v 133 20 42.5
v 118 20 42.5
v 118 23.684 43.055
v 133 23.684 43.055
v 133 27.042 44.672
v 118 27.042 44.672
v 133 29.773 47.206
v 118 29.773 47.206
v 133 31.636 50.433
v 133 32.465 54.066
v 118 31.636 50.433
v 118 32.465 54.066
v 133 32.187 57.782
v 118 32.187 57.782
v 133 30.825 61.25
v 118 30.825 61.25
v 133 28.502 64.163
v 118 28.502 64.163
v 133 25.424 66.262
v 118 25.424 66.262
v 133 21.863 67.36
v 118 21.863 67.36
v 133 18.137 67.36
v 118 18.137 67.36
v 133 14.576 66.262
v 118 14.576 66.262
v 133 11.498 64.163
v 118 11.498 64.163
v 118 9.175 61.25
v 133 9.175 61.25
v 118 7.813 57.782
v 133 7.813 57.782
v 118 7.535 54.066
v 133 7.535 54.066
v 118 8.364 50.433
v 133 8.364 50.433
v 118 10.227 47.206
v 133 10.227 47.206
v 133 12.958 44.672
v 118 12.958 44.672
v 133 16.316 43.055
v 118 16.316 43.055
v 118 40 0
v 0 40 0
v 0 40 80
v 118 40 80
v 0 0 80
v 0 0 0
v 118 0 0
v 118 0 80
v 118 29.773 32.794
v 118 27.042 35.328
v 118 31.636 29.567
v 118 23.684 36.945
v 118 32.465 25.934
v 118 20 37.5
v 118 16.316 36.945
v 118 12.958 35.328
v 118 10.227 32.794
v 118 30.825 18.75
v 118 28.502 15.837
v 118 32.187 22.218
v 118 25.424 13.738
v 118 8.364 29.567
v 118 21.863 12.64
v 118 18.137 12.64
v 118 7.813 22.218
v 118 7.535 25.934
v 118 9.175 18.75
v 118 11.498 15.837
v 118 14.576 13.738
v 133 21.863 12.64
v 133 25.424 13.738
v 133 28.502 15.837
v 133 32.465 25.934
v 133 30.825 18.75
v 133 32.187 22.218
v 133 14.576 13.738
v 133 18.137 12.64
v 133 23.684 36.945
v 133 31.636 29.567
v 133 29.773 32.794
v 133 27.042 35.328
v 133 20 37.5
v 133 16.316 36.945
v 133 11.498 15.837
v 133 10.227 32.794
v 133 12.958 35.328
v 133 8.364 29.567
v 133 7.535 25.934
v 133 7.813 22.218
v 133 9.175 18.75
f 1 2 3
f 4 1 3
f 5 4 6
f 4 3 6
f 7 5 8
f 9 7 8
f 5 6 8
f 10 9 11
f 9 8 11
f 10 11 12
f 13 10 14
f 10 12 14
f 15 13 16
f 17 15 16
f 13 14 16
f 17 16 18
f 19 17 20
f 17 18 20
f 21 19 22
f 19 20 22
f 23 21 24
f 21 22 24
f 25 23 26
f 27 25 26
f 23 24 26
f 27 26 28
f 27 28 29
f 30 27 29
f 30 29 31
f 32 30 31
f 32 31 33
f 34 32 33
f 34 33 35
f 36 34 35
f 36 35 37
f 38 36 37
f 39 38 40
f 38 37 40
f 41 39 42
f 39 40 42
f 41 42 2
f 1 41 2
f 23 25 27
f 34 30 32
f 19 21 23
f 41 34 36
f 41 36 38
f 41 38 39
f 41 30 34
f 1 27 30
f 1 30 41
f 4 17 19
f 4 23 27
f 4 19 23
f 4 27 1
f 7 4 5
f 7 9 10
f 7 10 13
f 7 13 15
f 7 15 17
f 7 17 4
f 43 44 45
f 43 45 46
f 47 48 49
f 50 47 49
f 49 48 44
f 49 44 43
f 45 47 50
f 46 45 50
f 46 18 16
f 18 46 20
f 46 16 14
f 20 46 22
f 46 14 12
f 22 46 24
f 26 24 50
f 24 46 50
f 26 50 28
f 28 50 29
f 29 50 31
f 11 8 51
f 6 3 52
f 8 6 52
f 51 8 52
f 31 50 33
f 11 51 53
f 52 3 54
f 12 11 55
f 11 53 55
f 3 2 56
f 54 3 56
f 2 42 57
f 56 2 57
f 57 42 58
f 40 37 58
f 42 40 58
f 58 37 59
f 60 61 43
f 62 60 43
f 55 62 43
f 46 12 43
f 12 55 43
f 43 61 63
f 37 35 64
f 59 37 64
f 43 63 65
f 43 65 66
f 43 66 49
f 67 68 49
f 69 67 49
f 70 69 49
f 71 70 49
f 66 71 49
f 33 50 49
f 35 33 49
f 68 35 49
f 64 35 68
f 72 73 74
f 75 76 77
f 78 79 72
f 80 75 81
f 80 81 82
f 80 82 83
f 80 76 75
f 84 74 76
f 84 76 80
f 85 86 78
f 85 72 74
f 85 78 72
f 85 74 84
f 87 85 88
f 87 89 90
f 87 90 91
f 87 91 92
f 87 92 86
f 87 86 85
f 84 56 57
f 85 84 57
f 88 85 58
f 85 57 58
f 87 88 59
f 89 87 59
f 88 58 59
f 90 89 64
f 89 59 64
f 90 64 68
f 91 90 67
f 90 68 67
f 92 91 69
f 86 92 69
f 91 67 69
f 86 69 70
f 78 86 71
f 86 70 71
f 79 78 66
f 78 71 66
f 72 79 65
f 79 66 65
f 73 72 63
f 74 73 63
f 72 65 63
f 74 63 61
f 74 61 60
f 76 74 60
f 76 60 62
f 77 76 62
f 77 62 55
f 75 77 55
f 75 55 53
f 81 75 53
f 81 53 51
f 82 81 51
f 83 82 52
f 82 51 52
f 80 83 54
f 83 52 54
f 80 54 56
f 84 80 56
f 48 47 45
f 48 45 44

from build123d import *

# Parameters (mm, degrees)
SKETCH2_W           = 118
SKETCH2_H           = 80
BOSS_EXTRUDE1_DEPTH = 40
SKETCH3_R           = 12.5
BOSS_EXTRUDE2_DEPTH = 15


with BuildPart() as part:
    # Sketch2 → Boss-Extrude1 (new body)
    with BuildSketch(Plane(origin=(0, 0, 0), x_dir=(1, 0, 0), z_dir=(0, 1, 0))):
        with Locations((59, -40)):
            Rectangle(SKETCH2_W, SKETCH2_H)
    extrude(amount=BOSS_EXTRUDE1_DEPTH)

    # Sketch3 → Boss-Extrude2 (add)
    with BuildSketch(Plane(origin=(118, 0, 0), x_dir=(0, 0, -1), z_dir=(1, 0, 0))):
        with Locations((-55, 20)):
            Circle(SKETCH3_R)
        with Locations(Location((-25, 20, 0), (0, 0, 180))):
            Circle(SKETCH3_R)
    extrude(amount=BOSS_EXTRUDE2_DEPTH)


solid = part.part
